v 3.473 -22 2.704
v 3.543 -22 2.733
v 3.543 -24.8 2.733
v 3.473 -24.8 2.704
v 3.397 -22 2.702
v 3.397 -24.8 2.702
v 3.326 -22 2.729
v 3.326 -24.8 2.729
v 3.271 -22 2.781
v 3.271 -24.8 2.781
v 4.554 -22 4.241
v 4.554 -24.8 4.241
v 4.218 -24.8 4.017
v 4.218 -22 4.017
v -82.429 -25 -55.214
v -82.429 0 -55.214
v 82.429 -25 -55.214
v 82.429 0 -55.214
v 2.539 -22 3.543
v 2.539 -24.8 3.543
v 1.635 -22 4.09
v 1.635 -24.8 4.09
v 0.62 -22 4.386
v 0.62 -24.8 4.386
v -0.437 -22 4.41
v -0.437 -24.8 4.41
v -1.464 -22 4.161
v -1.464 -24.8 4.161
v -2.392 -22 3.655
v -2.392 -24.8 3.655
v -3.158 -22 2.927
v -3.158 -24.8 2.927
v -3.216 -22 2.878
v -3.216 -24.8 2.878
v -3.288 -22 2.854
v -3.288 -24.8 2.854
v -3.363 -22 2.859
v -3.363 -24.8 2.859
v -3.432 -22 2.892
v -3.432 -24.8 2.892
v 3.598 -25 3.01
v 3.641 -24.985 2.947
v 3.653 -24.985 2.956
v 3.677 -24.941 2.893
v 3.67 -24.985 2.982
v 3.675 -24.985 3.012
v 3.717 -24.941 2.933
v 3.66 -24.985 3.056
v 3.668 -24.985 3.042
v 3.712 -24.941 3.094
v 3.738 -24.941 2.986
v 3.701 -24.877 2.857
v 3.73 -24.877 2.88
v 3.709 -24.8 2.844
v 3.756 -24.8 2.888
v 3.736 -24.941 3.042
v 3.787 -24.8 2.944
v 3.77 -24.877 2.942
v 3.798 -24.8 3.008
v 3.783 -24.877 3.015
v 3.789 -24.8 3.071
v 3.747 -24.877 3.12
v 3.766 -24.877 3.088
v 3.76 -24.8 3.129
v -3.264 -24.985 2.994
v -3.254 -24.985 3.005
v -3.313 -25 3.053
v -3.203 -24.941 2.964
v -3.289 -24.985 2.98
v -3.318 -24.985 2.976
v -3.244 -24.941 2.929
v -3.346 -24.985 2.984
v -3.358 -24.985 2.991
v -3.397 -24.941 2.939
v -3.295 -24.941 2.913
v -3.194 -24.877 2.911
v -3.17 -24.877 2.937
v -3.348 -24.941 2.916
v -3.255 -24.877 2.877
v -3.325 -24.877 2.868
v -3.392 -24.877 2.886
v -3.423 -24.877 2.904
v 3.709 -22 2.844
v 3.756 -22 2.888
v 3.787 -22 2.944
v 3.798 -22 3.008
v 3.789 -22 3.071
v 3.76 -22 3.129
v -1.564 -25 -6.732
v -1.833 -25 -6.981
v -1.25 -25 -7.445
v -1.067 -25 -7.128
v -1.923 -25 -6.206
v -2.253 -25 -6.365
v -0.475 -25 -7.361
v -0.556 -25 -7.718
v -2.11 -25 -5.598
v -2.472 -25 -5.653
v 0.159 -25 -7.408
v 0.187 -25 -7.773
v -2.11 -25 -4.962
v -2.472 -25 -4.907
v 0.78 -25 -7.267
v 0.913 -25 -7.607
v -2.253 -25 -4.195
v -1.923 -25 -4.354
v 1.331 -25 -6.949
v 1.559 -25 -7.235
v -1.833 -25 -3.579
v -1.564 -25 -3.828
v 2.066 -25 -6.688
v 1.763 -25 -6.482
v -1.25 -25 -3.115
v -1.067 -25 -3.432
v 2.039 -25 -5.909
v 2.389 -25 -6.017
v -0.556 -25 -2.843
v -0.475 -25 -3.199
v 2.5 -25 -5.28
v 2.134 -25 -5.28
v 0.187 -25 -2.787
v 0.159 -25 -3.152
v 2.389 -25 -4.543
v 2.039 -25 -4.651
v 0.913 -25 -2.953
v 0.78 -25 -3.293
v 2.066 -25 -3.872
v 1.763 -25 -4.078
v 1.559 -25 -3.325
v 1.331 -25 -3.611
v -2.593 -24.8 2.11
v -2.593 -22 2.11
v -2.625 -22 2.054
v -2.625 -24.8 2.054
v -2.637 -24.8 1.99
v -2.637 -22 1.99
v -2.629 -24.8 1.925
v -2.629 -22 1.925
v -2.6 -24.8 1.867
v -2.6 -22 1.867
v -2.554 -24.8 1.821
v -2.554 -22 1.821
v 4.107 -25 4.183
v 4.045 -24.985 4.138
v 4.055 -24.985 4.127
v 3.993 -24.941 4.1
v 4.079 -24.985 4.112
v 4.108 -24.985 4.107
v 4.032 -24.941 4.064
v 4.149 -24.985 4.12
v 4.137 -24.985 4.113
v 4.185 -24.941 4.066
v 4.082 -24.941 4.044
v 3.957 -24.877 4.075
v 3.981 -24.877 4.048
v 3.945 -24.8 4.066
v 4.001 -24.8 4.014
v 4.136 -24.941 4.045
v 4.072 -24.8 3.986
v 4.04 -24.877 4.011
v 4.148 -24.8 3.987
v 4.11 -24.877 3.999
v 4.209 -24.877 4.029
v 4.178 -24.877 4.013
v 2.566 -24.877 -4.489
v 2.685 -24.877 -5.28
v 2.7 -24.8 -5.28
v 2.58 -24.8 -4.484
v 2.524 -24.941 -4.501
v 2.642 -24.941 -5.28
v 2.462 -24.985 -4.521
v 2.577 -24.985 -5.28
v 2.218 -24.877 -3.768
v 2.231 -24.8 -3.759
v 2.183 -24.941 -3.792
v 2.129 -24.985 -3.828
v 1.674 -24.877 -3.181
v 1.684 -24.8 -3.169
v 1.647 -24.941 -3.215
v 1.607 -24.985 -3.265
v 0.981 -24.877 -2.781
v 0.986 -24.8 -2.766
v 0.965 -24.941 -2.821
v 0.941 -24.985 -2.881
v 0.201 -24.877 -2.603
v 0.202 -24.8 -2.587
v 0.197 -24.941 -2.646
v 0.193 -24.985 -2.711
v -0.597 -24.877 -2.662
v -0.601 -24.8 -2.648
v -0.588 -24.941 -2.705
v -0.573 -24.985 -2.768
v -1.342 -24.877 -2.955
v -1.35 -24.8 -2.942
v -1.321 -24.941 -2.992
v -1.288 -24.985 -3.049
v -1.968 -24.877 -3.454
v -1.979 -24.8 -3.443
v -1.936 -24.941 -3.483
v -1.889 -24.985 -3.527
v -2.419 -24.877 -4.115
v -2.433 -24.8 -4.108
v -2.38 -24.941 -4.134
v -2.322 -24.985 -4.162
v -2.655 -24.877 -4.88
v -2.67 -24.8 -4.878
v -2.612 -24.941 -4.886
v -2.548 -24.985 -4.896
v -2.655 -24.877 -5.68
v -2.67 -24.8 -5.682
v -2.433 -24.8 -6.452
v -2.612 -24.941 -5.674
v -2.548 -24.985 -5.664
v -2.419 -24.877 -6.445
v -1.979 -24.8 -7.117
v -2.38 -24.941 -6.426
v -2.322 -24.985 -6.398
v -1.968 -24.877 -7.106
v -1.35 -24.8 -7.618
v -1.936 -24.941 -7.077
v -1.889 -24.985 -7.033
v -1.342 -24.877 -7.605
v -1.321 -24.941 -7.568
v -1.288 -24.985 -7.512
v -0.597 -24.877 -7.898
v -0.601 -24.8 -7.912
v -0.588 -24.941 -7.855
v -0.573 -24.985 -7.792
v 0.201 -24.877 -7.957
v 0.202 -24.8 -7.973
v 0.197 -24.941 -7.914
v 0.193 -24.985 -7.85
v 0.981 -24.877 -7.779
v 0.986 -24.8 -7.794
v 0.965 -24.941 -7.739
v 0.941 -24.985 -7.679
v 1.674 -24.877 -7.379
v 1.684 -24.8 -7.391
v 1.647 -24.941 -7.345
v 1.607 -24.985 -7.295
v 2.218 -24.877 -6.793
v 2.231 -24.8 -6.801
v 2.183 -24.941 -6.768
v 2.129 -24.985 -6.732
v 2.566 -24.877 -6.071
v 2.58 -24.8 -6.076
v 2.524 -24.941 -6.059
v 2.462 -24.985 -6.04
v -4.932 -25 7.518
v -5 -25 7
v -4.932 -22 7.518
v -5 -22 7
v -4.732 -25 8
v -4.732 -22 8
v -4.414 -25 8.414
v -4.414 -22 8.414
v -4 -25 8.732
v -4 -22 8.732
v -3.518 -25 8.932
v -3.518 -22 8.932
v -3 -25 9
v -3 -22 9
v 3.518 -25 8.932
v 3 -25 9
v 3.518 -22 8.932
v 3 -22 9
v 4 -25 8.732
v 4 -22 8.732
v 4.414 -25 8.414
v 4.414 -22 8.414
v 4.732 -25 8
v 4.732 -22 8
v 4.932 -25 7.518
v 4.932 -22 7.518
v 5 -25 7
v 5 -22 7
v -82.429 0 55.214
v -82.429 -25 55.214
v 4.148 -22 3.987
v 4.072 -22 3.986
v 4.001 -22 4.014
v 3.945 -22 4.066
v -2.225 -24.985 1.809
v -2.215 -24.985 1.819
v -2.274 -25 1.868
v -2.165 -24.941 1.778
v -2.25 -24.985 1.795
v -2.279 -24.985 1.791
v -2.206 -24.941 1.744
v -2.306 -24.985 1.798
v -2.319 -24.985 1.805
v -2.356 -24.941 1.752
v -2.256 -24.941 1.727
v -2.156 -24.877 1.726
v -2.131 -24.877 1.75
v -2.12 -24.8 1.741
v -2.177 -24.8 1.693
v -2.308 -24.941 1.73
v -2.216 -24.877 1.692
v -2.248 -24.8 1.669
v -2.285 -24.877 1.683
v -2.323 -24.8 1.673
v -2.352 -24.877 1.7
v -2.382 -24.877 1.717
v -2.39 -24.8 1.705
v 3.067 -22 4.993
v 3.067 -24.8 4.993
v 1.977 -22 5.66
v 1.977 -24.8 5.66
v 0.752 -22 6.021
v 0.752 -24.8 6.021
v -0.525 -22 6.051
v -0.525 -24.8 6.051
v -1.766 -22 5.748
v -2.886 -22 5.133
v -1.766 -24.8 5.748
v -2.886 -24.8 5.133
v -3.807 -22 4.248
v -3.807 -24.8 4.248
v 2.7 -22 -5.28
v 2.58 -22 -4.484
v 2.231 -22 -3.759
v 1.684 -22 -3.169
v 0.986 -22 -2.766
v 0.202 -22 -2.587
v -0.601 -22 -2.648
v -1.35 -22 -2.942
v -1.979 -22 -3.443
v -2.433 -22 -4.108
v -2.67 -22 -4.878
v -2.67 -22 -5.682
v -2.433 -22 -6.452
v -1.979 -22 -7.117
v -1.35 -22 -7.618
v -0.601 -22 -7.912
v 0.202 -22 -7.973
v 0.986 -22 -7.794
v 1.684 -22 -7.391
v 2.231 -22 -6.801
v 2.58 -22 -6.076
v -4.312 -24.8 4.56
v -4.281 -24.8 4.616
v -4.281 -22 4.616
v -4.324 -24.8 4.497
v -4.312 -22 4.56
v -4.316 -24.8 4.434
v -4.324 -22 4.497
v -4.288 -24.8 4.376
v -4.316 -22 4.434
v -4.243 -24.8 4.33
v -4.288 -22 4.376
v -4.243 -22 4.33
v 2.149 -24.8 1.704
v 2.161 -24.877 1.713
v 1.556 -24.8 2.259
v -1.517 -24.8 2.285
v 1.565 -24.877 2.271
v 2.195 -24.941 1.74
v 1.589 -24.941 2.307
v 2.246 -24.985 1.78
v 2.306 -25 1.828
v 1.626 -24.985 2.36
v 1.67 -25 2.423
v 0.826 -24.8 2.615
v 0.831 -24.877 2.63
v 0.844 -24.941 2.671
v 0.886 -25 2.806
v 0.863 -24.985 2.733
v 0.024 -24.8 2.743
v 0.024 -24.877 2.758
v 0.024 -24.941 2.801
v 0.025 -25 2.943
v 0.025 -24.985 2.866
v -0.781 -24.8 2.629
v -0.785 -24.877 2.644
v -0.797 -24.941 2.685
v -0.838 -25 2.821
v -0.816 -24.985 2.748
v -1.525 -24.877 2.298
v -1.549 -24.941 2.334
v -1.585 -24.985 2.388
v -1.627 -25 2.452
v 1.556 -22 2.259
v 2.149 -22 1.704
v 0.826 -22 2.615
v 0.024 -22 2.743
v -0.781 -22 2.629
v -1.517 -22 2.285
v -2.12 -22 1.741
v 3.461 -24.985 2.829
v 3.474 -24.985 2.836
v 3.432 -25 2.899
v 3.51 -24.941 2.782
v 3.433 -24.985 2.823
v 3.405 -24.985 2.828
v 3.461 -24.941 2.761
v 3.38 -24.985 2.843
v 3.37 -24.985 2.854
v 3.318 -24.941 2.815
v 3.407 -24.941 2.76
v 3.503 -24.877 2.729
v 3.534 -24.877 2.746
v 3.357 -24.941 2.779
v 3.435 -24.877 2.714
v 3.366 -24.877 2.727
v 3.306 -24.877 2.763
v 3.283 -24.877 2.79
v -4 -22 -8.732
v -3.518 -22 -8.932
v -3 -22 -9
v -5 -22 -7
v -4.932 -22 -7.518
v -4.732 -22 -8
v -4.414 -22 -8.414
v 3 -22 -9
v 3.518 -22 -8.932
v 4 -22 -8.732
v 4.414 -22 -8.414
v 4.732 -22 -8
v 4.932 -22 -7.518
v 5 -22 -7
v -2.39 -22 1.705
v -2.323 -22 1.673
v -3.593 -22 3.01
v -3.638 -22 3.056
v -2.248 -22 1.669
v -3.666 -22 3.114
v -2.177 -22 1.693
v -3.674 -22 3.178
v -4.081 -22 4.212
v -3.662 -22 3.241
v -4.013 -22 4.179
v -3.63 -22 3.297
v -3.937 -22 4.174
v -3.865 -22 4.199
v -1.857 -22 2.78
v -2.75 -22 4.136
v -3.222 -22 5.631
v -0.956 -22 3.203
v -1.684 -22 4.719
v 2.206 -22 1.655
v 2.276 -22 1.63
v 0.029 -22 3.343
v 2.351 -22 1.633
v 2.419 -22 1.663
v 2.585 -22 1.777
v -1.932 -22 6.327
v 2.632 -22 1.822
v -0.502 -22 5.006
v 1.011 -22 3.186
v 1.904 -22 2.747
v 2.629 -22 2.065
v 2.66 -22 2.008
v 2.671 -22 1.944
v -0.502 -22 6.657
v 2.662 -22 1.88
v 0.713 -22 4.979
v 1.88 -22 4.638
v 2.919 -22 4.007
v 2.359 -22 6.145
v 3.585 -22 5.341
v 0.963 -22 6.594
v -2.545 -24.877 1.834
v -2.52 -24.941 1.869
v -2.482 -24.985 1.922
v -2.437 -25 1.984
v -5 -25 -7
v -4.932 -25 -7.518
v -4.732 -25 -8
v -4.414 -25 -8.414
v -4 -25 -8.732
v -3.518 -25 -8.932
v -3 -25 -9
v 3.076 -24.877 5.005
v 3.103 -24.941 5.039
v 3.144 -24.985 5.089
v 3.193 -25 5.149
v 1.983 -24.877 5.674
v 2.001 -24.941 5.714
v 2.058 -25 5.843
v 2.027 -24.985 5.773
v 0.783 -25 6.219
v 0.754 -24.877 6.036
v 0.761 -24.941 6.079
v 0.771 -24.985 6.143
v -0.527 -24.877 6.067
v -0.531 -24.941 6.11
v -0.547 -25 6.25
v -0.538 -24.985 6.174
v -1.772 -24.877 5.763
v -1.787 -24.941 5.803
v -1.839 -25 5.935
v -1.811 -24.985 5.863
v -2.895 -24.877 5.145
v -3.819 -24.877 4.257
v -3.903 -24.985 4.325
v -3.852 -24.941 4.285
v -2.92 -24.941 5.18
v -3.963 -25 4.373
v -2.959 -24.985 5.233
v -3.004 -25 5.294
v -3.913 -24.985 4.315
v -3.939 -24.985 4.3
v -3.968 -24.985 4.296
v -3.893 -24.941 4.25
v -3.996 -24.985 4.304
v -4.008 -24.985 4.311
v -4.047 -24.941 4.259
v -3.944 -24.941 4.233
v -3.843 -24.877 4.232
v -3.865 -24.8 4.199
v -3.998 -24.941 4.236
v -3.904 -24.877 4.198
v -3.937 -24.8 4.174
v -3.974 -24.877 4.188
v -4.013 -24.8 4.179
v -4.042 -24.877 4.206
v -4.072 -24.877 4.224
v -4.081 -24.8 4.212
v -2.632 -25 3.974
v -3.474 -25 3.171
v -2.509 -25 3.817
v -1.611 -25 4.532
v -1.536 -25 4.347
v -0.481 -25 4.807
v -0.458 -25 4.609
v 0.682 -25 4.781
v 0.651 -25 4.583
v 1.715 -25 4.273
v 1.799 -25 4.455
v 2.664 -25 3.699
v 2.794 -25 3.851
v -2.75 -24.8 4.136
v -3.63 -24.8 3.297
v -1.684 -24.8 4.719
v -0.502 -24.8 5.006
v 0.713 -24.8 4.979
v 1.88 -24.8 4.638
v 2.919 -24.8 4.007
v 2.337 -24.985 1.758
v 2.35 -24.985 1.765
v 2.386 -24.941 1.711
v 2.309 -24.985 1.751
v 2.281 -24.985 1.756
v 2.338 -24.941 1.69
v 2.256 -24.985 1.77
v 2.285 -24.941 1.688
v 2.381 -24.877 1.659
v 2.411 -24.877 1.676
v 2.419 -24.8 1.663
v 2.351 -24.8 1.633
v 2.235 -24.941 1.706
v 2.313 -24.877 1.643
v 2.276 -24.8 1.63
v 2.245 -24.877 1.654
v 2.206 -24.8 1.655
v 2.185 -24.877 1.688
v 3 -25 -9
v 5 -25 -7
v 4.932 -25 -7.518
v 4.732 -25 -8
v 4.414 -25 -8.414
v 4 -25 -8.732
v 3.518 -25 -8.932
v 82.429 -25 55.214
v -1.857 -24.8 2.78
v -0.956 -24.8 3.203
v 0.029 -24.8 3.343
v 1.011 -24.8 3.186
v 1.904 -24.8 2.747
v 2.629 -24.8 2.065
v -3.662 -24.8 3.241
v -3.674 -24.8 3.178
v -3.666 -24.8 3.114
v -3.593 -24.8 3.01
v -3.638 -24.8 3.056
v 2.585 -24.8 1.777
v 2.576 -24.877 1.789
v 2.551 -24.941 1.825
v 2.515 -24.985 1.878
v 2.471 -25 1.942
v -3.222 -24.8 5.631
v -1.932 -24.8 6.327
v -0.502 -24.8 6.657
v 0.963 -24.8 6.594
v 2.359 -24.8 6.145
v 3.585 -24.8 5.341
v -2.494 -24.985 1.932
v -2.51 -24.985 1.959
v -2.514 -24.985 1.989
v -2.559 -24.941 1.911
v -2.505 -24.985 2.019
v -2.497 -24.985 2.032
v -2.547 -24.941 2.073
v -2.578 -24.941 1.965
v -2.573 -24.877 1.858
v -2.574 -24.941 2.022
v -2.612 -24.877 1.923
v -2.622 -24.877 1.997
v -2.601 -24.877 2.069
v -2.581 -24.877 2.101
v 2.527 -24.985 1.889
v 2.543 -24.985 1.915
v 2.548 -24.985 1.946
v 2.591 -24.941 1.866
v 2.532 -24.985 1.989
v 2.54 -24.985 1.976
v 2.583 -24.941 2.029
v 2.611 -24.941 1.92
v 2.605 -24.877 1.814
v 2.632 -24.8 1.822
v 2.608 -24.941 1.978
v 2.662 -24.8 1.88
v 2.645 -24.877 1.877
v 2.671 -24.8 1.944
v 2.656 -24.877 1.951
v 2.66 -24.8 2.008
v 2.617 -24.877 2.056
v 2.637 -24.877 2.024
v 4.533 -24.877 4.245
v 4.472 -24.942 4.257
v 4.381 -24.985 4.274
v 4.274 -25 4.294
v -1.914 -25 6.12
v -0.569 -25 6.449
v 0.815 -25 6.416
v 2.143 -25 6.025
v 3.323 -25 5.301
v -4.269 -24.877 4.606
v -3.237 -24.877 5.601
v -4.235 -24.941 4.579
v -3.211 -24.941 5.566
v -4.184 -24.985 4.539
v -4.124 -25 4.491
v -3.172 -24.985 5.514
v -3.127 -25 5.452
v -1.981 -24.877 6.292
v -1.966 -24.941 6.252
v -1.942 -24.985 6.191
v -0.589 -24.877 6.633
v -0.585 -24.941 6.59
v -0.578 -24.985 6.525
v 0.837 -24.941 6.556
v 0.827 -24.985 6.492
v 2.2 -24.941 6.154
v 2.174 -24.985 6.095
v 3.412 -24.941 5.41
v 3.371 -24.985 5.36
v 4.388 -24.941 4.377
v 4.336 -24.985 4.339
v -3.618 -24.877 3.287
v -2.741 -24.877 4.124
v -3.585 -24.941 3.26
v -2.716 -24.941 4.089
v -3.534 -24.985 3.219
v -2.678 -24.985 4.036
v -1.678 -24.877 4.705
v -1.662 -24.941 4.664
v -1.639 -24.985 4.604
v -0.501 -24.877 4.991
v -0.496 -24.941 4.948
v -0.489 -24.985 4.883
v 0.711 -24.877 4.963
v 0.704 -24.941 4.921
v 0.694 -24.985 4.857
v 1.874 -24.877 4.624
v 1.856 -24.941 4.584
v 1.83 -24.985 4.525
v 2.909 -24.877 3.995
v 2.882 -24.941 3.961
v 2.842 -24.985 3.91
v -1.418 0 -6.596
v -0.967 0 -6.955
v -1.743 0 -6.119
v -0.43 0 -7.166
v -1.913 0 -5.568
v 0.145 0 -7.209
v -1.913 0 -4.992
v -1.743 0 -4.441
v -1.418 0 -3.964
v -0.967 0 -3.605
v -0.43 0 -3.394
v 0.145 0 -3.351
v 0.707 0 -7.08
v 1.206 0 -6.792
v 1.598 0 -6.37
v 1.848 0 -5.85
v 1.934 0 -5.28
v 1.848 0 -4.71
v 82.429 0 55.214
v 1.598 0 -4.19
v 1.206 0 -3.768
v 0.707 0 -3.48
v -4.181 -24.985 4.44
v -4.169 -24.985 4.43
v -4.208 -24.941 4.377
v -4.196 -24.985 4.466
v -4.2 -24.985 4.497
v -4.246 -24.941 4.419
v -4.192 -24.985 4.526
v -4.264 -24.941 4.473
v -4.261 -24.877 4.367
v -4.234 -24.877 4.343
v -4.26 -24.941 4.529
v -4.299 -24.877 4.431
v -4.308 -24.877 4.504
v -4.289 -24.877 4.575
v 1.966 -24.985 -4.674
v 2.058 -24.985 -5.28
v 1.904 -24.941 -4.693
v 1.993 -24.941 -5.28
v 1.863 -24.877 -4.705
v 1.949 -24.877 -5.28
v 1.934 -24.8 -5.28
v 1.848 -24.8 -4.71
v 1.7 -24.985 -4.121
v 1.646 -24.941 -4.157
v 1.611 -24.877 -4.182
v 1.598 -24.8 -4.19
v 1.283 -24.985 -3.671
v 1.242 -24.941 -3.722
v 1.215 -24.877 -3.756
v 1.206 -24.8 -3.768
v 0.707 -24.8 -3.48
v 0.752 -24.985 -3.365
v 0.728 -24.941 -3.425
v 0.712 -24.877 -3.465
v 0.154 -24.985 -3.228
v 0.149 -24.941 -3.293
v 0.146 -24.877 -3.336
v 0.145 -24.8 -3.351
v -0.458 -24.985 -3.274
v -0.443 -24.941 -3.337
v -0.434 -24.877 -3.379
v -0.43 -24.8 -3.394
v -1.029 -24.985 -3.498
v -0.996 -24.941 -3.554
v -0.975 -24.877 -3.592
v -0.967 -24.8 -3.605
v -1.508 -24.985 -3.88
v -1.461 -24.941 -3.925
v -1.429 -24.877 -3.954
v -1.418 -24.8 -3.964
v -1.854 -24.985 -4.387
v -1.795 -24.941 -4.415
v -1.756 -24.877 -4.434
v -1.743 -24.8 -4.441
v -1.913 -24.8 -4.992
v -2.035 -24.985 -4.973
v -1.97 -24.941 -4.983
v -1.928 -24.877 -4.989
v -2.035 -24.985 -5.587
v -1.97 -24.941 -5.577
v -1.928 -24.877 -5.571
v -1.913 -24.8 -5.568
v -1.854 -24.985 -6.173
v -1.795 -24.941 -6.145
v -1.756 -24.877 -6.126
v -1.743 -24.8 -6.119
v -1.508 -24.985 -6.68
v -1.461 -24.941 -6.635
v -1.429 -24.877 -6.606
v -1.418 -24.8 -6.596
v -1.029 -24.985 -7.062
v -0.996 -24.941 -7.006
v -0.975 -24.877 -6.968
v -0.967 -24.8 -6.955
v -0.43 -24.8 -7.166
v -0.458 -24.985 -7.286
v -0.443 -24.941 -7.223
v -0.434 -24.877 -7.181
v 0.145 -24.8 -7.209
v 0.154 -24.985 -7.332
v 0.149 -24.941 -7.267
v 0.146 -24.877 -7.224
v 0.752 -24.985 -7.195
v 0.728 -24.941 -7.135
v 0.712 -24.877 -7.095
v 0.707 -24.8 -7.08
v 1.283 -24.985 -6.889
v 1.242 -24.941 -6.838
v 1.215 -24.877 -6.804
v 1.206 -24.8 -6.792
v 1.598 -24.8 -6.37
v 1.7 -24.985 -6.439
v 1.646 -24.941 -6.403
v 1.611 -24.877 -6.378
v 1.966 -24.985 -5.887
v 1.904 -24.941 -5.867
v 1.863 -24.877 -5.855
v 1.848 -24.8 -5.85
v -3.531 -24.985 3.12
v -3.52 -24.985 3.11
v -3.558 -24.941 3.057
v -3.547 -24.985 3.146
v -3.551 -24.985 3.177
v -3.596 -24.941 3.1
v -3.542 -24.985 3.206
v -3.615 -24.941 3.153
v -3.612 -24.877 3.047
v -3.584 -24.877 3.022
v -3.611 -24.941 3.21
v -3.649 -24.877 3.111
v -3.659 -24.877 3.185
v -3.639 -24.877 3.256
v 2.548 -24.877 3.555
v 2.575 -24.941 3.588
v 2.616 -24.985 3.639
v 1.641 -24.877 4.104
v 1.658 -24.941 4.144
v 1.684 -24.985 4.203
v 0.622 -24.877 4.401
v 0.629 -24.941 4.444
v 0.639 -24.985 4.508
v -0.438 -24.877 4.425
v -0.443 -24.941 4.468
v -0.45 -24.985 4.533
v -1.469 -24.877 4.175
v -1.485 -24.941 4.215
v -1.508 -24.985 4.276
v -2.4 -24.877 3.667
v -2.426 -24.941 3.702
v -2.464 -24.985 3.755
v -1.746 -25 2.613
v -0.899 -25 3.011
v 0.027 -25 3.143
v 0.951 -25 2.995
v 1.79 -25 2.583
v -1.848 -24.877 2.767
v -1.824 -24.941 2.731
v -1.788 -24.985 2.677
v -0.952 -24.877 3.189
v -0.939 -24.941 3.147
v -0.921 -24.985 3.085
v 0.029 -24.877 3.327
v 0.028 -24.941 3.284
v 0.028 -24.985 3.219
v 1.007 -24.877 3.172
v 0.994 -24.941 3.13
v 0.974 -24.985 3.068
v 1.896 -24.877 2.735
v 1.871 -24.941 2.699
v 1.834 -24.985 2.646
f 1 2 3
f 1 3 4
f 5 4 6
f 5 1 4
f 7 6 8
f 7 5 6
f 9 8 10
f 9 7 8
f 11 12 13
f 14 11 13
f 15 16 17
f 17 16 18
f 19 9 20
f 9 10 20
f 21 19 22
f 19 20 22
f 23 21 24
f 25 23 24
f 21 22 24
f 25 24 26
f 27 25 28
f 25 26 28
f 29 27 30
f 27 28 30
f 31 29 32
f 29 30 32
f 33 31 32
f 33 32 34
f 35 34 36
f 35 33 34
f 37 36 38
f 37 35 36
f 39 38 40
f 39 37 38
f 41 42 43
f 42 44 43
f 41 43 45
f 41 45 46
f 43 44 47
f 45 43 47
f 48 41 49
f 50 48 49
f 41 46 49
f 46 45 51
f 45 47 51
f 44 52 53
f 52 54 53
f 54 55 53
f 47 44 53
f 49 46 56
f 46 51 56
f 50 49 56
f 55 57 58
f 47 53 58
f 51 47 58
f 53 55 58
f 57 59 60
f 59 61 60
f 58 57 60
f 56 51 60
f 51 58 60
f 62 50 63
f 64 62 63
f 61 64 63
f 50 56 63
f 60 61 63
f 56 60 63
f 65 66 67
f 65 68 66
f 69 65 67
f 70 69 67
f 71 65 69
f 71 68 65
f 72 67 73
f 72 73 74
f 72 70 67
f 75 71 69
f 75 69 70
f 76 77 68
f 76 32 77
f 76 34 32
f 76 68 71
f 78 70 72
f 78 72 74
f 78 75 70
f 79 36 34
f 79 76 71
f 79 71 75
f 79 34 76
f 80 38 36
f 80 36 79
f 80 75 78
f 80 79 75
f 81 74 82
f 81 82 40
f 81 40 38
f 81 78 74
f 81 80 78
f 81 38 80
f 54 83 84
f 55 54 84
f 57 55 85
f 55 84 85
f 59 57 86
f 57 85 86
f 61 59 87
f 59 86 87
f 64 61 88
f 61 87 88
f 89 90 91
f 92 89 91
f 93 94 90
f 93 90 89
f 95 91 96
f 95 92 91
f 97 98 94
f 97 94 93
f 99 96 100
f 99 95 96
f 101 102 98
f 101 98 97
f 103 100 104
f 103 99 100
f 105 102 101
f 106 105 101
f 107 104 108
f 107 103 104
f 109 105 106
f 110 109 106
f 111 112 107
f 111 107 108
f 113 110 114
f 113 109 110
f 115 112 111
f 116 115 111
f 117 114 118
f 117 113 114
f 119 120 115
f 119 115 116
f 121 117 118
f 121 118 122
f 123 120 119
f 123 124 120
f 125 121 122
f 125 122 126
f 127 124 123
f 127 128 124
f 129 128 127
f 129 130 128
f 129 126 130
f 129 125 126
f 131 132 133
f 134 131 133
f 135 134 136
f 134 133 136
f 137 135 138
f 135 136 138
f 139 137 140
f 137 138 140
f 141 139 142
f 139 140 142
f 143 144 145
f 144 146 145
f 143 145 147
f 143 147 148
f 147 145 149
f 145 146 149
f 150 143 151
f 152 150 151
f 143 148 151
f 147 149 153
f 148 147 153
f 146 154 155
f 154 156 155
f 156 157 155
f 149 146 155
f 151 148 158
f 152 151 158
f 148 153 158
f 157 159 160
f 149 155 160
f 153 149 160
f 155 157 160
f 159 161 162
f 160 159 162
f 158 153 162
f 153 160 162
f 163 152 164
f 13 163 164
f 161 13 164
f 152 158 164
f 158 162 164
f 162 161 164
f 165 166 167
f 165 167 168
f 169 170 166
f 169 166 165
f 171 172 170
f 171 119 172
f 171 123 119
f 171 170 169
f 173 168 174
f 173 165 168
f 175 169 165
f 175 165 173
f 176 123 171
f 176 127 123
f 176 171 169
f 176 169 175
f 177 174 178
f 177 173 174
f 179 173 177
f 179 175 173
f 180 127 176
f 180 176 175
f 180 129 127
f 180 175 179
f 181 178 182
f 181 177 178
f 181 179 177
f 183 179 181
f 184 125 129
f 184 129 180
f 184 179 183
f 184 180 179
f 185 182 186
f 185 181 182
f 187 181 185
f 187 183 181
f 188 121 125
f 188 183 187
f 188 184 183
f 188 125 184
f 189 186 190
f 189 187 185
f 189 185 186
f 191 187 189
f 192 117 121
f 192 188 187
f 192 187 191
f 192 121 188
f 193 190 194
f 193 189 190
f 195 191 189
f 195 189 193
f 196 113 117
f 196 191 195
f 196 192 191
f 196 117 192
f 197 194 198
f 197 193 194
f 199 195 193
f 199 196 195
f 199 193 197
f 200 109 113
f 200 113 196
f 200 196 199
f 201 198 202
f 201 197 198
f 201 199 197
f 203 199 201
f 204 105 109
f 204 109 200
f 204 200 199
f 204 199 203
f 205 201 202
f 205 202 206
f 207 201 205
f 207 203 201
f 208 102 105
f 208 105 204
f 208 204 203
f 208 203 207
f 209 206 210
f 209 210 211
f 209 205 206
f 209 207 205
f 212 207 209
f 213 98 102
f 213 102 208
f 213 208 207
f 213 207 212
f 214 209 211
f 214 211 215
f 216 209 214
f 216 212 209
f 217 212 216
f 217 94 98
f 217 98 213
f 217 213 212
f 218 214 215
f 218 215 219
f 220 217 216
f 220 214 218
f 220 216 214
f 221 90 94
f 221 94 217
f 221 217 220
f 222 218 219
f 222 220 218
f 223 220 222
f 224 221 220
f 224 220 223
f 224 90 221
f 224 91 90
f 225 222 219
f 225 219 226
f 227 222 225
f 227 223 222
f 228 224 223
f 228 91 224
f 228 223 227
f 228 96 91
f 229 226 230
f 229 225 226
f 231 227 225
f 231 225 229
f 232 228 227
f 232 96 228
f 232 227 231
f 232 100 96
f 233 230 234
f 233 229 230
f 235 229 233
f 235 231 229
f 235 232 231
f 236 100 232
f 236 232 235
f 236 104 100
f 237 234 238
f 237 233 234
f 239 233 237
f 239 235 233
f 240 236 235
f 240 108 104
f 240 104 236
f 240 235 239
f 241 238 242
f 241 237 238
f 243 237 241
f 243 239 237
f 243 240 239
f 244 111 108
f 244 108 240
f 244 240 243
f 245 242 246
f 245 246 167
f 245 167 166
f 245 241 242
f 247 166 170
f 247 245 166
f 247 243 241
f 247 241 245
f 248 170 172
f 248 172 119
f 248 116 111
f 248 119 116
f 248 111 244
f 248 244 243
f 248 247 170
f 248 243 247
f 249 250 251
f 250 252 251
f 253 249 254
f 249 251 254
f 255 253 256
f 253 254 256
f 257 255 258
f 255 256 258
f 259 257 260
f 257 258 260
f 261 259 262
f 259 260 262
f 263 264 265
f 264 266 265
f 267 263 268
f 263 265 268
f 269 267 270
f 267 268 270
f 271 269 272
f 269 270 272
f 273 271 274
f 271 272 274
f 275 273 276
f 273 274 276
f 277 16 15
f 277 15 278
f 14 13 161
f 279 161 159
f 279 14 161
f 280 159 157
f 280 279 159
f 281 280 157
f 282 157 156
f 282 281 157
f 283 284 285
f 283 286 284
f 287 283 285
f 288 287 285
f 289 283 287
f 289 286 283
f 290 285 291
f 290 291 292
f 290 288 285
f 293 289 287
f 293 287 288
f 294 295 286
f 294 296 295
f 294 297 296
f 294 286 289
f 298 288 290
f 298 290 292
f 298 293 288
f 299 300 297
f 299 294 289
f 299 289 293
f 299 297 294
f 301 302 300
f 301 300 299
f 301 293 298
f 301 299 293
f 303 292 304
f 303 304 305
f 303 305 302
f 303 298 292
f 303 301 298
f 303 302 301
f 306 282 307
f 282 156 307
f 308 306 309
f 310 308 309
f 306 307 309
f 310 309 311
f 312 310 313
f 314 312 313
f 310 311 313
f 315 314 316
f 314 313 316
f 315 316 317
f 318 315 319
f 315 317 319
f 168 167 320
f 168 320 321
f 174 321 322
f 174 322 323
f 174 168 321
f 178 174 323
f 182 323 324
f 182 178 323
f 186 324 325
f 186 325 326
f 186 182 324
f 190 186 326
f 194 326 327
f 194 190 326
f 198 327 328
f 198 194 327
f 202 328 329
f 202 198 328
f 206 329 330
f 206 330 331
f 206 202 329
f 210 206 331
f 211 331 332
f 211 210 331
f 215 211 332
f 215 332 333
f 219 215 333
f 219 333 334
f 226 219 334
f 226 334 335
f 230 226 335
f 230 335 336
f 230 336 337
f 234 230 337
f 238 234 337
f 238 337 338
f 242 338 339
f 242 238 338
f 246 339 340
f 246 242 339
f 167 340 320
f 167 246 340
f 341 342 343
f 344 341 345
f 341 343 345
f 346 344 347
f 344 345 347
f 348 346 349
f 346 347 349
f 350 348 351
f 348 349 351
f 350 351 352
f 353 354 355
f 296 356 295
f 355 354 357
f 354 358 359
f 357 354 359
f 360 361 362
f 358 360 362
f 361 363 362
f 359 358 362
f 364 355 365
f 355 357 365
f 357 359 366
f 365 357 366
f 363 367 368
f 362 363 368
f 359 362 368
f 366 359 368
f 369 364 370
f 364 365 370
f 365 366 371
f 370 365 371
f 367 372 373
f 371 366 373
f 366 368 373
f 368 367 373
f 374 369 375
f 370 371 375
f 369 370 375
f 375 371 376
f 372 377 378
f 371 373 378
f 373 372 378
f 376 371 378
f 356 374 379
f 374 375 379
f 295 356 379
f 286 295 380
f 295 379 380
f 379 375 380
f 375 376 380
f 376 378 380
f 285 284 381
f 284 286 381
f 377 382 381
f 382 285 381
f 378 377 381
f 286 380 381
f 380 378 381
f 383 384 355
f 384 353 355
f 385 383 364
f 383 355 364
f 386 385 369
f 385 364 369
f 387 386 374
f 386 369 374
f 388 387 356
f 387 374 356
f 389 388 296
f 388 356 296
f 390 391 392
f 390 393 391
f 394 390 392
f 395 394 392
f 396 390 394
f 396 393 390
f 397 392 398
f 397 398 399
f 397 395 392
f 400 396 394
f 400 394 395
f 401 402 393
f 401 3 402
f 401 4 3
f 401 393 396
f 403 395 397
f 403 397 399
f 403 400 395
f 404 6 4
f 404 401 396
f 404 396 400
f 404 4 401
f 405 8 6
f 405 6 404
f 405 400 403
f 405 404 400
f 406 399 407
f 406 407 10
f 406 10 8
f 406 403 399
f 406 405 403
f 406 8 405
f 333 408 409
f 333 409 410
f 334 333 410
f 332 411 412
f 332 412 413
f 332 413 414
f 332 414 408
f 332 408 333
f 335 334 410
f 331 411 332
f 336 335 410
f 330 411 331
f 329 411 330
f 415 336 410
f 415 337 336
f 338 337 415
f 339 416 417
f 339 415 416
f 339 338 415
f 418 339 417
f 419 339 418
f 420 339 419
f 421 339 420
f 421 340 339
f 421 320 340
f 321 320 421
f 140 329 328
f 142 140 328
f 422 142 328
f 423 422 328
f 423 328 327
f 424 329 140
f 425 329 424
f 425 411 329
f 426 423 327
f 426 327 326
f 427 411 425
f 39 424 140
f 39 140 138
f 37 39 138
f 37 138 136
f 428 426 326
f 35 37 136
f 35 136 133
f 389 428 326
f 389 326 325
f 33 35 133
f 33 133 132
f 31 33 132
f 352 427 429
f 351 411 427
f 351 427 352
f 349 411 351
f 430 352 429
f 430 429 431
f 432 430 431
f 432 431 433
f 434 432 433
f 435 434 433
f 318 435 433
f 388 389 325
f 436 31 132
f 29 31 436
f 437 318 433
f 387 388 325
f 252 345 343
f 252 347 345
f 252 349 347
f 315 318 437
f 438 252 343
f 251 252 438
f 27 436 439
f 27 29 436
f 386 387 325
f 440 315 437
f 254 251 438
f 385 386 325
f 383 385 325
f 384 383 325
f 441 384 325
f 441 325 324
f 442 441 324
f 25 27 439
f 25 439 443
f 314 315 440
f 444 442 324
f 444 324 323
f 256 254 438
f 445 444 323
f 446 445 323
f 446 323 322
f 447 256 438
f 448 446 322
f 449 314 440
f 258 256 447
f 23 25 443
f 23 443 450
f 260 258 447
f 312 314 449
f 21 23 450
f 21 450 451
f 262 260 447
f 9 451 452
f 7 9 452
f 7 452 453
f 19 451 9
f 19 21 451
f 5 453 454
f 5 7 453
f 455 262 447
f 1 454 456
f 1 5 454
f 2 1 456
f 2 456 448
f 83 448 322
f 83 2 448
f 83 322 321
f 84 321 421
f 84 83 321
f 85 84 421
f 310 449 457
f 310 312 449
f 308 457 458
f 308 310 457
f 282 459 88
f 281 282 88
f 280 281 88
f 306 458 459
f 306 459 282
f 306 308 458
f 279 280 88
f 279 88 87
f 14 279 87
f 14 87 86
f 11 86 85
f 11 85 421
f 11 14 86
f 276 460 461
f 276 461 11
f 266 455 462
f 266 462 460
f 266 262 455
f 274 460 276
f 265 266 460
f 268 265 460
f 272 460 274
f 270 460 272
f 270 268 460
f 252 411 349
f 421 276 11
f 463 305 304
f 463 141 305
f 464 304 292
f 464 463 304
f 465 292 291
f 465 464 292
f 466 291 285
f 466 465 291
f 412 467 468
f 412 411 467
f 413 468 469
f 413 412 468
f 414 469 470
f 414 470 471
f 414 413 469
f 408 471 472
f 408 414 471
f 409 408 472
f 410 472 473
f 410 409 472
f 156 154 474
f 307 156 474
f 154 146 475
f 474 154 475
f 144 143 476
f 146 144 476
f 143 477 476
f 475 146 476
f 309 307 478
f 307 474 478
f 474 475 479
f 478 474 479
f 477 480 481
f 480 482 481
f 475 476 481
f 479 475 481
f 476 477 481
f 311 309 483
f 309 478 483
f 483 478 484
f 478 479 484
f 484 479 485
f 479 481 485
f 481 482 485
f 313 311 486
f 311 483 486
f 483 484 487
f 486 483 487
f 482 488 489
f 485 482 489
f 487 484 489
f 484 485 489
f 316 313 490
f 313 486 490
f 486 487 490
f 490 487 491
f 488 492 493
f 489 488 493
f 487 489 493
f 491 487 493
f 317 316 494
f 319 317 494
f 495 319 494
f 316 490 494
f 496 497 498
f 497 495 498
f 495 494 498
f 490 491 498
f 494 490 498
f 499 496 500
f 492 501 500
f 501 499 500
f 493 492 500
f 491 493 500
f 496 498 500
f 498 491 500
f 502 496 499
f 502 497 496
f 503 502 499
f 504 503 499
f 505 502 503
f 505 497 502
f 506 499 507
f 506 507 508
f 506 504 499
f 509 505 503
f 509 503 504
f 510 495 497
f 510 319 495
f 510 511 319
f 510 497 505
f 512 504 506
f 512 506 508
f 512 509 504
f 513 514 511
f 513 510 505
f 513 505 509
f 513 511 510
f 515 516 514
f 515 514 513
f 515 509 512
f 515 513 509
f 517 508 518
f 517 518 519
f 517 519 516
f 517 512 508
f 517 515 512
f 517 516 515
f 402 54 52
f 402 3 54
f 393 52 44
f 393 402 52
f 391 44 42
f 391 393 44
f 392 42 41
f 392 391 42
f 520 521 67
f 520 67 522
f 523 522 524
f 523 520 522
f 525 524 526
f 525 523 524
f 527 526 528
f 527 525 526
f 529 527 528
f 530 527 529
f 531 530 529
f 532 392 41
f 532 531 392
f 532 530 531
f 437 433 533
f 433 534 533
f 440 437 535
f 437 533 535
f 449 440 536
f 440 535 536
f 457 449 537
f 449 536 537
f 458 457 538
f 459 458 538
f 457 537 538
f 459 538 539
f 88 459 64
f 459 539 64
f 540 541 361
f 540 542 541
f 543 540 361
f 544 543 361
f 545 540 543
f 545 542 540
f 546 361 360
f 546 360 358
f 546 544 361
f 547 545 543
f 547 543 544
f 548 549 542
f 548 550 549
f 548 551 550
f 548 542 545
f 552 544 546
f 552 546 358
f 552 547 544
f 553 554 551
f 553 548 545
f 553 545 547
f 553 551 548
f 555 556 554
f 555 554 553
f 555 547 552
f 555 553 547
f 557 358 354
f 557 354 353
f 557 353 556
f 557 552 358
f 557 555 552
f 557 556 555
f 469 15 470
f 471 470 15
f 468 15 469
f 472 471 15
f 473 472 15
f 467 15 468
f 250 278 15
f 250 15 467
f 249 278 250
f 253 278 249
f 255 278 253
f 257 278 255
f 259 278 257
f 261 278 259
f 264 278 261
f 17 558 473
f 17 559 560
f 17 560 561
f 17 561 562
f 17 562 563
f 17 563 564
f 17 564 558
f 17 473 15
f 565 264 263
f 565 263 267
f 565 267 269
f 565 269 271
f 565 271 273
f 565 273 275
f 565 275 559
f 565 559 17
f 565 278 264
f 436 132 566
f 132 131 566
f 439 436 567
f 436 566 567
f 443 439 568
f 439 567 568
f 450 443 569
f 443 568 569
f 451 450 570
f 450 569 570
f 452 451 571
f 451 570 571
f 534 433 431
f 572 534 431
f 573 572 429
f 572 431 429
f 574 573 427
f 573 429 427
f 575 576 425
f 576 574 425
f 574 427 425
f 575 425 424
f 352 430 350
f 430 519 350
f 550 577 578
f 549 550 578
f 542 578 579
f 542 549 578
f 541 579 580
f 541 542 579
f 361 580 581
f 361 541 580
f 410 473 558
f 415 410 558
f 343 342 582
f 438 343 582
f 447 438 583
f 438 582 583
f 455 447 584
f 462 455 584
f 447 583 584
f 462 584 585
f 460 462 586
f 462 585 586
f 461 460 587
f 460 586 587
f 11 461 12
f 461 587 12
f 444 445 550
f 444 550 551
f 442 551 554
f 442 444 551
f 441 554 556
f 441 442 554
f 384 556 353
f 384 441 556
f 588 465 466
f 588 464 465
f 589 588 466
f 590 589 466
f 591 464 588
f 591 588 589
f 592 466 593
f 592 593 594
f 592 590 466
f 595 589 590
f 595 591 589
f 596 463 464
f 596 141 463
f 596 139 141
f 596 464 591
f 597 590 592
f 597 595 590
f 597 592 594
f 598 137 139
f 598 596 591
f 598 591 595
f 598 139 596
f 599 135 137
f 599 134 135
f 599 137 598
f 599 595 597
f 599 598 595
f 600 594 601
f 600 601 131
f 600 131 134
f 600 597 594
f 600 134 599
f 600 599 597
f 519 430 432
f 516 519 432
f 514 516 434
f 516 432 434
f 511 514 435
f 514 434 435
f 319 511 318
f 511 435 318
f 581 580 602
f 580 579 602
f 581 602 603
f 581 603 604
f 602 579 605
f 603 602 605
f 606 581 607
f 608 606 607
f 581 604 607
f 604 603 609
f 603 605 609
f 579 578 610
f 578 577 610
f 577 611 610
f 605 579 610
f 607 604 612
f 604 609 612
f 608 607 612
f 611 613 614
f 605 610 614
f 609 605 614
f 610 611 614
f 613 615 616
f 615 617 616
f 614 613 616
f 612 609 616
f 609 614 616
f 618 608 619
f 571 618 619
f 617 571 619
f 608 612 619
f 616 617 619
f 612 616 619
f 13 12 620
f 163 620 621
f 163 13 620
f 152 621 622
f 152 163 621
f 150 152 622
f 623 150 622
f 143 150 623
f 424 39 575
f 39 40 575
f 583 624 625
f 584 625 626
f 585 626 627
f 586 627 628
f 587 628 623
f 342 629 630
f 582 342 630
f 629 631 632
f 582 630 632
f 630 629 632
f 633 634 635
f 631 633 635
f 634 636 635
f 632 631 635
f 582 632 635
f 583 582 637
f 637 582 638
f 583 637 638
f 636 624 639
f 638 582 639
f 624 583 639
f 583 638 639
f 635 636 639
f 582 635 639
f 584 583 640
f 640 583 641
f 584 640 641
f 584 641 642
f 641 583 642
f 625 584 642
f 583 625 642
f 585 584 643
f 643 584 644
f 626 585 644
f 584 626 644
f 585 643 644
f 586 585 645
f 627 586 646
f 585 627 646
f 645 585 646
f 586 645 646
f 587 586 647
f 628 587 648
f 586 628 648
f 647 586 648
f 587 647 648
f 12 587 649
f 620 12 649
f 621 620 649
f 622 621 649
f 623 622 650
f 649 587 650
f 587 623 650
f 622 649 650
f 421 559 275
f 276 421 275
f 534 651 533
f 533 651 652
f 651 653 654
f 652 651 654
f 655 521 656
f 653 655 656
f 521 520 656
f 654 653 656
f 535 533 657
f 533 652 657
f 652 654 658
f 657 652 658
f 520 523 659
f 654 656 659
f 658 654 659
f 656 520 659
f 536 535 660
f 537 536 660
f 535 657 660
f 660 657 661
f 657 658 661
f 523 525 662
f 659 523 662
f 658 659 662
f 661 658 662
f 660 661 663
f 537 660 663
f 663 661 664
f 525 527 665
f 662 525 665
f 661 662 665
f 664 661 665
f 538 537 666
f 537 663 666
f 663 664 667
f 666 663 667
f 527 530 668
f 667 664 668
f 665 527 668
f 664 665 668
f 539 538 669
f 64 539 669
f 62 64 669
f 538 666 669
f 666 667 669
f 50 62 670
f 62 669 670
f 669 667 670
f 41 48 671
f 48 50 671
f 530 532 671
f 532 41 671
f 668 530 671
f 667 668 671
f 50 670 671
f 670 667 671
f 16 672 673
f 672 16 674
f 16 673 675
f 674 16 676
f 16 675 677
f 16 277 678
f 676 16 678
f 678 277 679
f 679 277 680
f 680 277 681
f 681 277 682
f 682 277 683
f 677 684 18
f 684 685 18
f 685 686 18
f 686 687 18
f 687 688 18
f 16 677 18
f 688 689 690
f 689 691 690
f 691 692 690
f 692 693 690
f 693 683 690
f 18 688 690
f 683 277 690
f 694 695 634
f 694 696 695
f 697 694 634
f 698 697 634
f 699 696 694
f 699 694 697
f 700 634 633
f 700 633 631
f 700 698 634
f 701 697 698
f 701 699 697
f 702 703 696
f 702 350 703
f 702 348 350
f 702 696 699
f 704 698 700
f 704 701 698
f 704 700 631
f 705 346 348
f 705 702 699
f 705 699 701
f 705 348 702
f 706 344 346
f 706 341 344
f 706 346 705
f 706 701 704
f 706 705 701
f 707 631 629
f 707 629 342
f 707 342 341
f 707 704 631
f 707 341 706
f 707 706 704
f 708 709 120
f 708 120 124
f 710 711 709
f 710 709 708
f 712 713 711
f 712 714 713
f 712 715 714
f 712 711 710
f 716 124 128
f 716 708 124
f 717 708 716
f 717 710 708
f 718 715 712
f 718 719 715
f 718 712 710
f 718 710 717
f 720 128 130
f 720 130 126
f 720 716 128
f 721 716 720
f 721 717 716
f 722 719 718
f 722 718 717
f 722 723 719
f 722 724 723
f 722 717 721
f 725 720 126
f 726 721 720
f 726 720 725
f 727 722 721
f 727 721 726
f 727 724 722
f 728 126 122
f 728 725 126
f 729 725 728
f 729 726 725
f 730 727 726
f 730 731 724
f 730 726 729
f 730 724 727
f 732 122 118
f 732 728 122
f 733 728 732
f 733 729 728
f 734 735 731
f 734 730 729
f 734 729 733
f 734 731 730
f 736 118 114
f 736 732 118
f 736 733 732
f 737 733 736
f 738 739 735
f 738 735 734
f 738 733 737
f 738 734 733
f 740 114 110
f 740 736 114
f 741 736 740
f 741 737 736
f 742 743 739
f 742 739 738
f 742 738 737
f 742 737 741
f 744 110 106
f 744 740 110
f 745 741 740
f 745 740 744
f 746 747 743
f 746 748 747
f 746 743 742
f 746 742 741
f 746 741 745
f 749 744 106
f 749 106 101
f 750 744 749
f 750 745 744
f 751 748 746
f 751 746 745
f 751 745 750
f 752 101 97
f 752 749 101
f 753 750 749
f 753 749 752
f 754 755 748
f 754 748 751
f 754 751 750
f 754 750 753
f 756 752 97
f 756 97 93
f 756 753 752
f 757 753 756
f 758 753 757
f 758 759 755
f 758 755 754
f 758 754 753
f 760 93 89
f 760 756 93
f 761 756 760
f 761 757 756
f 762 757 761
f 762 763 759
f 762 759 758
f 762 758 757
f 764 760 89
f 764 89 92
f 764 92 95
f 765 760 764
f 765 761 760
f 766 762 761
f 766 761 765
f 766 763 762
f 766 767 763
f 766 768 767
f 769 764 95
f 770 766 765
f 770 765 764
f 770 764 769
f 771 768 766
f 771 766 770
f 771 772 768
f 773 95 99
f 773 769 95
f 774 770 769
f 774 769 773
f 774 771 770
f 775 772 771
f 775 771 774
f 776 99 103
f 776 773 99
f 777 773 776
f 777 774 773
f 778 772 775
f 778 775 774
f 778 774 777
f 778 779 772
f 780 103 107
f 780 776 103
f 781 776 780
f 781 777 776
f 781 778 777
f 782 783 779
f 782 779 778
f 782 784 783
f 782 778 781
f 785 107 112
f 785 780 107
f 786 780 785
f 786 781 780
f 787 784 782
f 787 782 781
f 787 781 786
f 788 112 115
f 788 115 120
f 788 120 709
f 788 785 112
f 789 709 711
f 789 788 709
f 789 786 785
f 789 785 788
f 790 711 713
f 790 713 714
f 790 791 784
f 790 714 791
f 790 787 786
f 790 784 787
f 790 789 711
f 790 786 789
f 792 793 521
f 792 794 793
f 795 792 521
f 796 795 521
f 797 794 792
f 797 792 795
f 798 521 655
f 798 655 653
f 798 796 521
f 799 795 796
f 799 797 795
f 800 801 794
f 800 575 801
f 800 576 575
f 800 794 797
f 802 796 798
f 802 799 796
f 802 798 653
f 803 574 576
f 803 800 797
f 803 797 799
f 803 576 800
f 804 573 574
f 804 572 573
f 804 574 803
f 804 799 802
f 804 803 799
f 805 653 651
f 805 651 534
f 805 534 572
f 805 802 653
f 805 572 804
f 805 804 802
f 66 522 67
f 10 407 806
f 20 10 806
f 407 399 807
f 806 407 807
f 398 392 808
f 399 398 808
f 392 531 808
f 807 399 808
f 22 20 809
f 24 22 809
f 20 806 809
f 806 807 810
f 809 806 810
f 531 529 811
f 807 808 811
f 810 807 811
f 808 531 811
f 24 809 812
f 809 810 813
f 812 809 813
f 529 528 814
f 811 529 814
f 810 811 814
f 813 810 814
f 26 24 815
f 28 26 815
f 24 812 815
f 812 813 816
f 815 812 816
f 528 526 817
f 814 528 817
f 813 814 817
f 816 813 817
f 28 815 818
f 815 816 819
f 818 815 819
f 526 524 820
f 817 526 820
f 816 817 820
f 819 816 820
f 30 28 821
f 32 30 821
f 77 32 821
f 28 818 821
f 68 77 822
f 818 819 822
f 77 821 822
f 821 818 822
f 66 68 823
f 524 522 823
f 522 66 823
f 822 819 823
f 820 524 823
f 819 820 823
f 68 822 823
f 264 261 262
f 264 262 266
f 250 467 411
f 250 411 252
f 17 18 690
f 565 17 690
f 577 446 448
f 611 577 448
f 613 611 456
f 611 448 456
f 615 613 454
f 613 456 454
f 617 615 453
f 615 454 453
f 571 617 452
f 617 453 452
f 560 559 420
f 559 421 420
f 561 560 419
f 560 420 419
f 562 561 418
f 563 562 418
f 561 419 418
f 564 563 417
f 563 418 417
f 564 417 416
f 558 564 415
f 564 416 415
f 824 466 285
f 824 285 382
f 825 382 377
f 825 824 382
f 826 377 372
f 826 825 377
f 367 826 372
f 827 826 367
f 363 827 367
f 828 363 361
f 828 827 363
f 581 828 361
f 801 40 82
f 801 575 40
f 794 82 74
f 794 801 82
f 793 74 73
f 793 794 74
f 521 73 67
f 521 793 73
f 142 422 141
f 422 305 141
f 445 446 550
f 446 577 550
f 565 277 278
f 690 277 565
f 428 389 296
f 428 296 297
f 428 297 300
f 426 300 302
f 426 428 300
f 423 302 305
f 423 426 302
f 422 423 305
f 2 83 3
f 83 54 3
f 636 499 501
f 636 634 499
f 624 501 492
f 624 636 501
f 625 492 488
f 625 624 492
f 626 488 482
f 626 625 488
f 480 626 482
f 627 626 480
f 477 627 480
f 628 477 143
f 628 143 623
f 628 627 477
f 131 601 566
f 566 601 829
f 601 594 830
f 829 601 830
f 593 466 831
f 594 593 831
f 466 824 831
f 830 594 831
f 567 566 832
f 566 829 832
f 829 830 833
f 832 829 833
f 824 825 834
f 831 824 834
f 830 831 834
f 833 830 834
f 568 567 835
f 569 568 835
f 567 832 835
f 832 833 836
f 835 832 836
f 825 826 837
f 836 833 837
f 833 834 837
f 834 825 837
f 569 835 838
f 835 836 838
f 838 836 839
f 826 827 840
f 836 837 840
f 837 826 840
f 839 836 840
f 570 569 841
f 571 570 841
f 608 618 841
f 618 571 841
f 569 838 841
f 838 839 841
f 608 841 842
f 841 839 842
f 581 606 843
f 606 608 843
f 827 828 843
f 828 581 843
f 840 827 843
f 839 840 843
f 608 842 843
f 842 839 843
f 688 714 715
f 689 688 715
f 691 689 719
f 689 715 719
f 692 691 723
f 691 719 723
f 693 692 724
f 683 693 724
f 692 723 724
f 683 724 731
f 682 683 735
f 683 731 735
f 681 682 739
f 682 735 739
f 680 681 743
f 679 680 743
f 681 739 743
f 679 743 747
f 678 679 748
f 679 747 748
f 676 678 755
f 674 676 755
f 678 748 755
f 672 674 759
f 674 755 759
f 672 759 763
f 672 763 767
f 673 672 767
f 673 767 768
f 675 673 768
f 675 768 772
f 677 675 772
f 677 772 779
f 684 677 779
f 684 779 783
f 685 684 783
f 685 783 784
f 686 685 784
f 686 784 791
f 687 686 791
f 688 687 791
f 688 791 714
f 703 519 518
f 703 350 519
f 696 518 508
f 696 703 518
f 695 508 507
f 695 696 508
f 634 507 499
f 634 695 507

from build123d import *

# Parameters (mm, degrees)
F0_W     = 164.8570299149
F0_H     = 110.4289069772
F1_DEPTH = 25
F2_W     = 10
F2_H     = 18
F2_R     = 2.7001764227
F2_R_2   = 1.9341682987
F3_DEPTH = 3
F4_DEPTH = 25
F5_R     = 2
F6_R     = 0.2
F7_R     = 0.2


with BuildPart() as f1:
    # F0 (on Front) → F1 (new body)
    with BuildSketch(Plane.XZ):
        Rectangle(F0_W, F0_H)
    extrude(amount=F1_DEPTH)

    # F2 (on face) → F3 (cut)
    with BuildSketch(Plane.XZ.offset(25)):
        Rectangle(F2_W, F2_H)
        with Locations((0, -5.2800131962)):
            Circle(F2_R, mode=Mode.SUBTRACT)
        with BuildLine():
            ThreePointArc((2.2602898534, 1.5537198633), (0.023716197, 2.7426981564), (-2.2330837499, 1.5925742058))
            Line((-2.2330837499, 1.5925742058), (-2.7215808881, 1.9409569934))
            ThreePointArc((-2.7215808881, 1.9409569934), (0.028904222, 3.3426757436), (2.7547384494, 1.8936030884))
            Line((2.7547384494, 1.8936030884), (2.2602898534, 1.5537198633))
        make_face(mode=Mode.SUBTRACT)
        with BuildLine():
            ThreePointArc((3.3802715561, 2.6244919898), (0.092503517, 4.4323042668), (-3.2741558808, 2.7760408799))
            Line((-3.2741558808, 2.7760408799), (-3.7576841163, 3.1312879295))
            ThreePointArc((-3.7576841163, 3.1312879295), (0.1061644617, 5.0321487461), (3.8794709835, 2.9573582578))
            Line((3.8794709835, 2.9573582578), (3.3802715561, 2.6244919898))
        make_face(mode=Mode.SUBTRACT)
        with BuildLine():
            ThreePointArc((4.0547181579, 3.9081449802), (0.1143542469, 6.0784267055), (-3.923536355, 4.0954920105))
            Line((-3.923536355, 4.0954920105), (-4.4068130665, 4.4510811567))
            ThreePointArc((-4.4068130665, 4.4510811567), (0.1284396891, 6.6782613669), (4.5541530248, 4.2406578889))
            Line((4.5541530248, 4.2406578889), (4.0547181579, 3.9081449802))
        make_face(mode=Mode.SUBTRACT)
        with Locations((0, -5.2800131962)):
            Circle(F2_R_2)
    extrude(amount=-F3_DEPTH, mode=Mode.SUBTRACT)

    # F4 (cut): a face of the model
    f4_faces = [f1.faces().sort_by_distance(p)[0] for p in [
        (0, -22, -5.2800131962),
    ]]
    extrude(f4_faces, amount=-F4_DEPTH, mode=Mode.SUBTRACT)

    # F5
    f5_edges = [f1.edges().sort_by_distance(p)[0] for p in [
        (-5, -23.5, 9),
        (5, -23.5, 9),
        (5, -23.5, -9),
        (-5, -23.5, -9),
    ]]
    fillet(f5_edges, radius=F5_R)

    # F6
    f6_edges = [f1.edges().sort_by_distance(p)[0] for p in [
        (-3.923536, -23.5, 4.095492),
        (-4.406813, -23.5, 4.451081),
        (-3.757684, -23.5, 3.131288),
        (-3.274156, -23.5, 2.776041),
        (-2.721581, -23.5, 1.940957),
        (-2.233084, -23.5, 1.592574),
        (2.26029, -23.5, 1.55372),
        (2.754738, -23.5, 1.893603),
        (3.380272, -23.5, 2.624492),
        (3.879471, -23.5, 2.957358),
        (4.054718, -23.5, 3.908145),
        (2.507514, -25, 1.723661),
        (0.023716, -25, 2.742698),
        (-2.477332, -25, 1.766766),
        (0.028904, -25, 3.342676),
        (3.629871, -25, 2.790925),
        (0.092504, -25, 4.432304),
        (-3.51592, -25, 2.953664),
        (0.106164, -25, 5.032149),
        (0.114354, -25, 6.078427),
        (-4.165175, -25, 4.273287),
        (0.12844, -25, 6.678261),
        (4.304436, -25, 4.074401),
    ]]
    fillet(f6_edges, radius=F6_R)

    # F7
    f7_edges = [f1.edges().sort_by_distance(p)[0] for p in [
        (-2.700176, -25, -5.280013),
        (-1.934168, -25, -5.280013),
    ]]
    fillet(f7_edges, radius=F7_R)


solid = f1.part
